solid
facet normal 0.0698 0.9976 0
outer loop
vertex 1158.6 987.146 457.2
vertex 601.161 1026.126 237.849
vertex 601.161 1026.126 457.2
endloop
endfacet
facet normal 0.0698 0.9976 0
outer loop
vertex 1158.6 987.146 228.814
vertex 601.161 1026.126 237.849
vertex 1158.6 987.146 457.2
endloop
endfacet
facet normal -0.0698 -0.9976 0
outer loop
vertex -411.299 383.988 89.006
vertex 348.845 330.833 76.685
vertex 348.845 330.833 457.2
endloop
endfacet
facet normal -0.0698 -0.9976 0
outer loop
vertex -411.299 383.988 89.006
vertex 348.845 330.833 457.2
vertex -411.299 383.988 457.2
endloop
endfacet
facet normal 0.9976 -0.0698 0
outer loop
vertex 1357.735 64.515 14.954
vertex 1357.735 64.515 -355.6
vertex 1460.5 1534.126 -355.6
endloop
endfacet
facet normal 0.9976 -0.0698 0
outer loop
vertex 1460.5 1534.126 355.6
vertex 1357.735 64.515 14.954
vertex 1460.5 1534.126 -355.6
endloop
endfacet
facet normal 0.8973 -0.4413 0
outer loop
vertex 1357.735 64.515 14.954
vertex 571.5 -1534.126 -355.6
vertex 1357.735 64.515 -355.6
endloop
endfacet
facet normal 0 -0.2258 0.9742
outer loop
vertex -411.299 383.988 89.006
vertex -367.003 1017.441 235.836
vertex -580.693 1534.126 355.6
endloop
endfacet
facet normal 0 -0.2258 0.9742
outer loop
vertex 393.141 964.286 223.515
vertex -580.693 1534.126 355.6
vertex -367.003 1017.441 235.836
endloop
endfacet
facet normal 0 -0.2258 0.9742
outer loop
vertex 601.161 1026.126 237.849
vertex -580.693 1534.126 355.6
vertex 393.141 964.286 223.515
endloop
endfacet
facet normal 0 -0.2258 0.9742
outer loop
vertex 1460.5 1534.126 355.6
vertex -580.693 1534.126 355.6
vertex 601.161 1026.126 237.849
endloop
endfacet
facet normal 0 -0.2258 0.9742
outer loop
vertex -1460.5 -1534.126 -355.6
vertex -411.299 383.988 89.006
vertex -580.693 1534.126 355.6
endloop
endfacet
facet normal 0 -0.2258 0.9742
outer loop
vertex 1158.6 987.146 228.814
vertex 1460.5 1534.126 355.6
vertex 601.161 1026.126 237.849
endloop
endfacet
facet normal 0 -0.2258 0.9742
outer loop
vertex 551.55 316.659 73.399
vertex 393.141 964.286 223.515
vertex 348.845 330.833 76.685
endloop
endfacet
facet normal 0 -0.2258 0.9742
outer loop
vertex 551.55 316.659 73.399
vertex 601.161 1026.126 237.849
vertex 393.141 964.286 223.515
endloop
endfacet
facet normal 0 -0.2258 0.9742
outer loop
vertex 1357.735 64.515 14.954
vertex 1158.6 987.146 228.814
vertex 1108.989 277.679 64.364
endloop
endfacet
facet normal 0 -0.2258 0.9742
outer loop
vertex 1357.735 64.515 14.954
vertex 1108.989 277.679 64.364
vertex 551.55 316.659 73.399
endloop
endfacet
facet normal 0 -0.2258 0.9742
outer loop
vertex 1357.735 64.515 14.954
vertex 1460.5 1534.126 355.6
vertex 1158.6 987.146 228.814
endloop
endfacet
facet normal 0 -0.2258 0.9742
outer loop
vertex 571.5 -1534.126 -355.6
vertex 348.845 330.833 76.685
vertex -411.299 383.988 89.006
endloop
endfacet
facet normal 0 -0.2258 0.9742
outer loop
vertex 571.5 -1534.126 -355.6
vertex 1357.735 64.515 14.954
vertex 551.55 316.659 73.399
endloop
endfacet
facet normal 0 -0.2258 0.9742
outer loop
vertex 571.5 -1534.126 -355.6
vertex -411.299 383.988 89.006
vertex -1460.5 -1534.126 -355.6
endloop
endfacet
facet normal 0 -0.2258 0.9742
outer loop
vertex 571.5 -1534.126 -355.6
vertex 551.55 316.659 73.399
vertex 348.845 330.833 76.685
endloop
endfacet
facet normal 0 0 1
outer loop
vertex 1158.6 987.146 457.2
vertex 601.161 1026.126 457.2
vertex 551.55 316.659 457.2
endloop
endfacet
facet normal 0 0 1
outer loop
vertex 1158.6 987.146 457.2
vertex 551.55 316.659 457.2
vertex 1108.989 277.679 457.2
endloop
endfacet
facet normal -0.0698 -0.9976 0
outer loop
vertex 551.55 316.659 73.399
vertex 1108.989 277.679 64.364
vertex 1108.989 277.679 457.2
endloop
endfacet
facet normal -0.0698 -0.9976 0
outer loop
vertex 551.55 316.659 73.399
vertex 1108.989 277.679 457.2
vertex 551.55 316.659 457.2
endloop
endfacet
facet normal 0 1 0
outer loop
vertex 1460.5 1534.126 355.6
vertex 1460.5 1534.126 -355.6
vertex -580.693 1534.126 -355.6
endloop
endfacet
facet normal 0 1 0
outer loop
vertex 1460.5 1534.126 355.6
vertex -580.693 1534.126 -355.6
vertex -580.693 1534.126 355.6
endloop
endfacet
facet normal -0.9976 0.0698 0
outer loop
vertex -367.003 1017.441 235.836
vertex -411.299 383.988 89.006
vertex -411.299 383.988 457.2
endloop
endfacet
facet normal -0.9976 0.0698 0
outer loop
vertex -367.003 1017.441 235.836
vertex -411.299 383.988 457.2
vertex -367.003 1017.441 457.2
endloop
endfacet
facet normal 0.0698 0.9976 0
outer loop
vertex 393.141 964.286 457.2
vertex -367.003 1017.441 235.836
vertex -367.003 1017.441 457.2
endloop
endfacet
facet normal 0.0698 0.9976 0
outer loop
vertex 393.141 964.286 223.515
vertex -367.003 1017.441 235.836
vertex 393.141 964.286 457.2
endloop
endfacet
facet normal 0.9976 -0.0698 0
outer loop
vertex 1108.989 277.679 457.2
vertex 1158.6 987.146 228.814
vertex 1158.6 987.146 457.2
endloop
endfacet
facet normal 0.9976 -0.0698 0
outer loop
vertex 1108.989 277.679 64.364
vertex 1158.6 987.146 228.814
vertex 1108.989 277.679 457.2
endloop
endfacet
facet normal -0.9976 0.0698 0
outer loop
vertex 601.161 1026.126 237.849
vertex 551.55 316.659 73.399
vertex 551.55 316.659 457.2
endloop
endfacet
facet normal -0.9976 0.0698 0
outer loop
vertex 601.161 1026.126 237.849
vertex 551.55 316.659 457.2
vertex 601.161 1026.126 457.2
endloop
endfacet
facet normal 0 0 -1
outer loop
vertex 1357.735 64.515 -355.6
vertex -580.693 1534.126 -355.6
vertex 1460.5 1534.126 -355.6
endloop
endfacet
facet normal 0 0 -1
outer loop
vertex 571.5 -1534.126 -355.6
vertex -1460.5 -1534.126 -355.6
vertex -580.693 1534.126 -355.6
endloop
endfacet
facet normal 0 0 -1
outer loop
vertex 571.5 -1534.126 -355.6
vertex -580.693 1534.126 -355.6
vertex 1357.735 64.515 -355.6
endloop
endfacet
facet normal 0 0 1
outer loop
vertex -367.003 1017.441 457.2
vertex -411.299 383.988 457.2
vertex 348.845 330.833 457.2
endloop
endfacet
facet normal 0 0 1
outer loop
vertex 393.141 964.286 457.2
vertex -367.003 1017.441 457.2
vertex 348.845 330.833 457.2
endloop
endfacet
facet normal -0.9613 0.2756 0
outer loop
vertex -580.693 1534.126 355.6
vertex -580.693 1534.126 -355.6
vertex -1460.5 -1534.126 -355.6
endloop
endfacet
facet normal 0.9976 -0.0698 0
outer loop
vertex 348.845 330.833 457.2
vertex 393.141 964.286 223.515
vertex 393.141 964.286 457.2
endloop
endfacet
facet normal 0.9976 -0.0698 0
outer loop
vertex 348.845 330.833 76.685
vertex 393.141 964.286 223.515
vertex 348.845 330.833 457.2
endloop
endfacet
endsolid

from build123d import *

# Parameters (mm, degrees)
F1_DEPTH = 1460.5
F3_DEPTH = 711.201
F5_DEPTH = 812.8


with BuildPart() as f1:
    # F0 (on Right) → F1 (new body, symmetric)
    with BuildSketch(Plane.YZ):
        Polygon((1534.126357, 355.6), (0, 0), (-1534.126357, -355.6), (1534.126357, -355.6), align=None)
    extrude(amount=F1_DEPTH, both=True)

    # F2 (on face) → F3 (cut, through all)
    with BuildSketch(Plane(origin=(0, 0, -355.6), x_dir=(1, 0, 0), z_dir=(0, 0, -1))):
        Polygon((-580.692692, -1534.126357), (-1460.5, 1534.126357), (-1460.5, -1534.126357), align=None)
        Polygon((1460.5, -1534.126357), (1460.5, 1534.126357), (571.5, 1534.126357), (1357.734763, -64.514998), align=None)
    extrude(amount=-F3_DEPTH, mode=Mode.SUBTRACT)

    # F4 (on face) → F5 (join)
    with BuildSketch(Plane(origin=(0, 0, -355.6), x_dir=(1, 0, 0), z_dir=(0, 0, -1))):
        Polygon((-411.298605, -383.987753), (-367.003244, -1017.440925), (393.140562, -964.286492), (348.845201, -330.83332), align=None)
        Polygon((551.550216, -316.658805), (601.16102, -1026.126357), (1158.599811, -987.14644), (1108.989007, -277.678887), align=None)
    extrude(amount=-F5_DEPTH)


solid = f1.part
